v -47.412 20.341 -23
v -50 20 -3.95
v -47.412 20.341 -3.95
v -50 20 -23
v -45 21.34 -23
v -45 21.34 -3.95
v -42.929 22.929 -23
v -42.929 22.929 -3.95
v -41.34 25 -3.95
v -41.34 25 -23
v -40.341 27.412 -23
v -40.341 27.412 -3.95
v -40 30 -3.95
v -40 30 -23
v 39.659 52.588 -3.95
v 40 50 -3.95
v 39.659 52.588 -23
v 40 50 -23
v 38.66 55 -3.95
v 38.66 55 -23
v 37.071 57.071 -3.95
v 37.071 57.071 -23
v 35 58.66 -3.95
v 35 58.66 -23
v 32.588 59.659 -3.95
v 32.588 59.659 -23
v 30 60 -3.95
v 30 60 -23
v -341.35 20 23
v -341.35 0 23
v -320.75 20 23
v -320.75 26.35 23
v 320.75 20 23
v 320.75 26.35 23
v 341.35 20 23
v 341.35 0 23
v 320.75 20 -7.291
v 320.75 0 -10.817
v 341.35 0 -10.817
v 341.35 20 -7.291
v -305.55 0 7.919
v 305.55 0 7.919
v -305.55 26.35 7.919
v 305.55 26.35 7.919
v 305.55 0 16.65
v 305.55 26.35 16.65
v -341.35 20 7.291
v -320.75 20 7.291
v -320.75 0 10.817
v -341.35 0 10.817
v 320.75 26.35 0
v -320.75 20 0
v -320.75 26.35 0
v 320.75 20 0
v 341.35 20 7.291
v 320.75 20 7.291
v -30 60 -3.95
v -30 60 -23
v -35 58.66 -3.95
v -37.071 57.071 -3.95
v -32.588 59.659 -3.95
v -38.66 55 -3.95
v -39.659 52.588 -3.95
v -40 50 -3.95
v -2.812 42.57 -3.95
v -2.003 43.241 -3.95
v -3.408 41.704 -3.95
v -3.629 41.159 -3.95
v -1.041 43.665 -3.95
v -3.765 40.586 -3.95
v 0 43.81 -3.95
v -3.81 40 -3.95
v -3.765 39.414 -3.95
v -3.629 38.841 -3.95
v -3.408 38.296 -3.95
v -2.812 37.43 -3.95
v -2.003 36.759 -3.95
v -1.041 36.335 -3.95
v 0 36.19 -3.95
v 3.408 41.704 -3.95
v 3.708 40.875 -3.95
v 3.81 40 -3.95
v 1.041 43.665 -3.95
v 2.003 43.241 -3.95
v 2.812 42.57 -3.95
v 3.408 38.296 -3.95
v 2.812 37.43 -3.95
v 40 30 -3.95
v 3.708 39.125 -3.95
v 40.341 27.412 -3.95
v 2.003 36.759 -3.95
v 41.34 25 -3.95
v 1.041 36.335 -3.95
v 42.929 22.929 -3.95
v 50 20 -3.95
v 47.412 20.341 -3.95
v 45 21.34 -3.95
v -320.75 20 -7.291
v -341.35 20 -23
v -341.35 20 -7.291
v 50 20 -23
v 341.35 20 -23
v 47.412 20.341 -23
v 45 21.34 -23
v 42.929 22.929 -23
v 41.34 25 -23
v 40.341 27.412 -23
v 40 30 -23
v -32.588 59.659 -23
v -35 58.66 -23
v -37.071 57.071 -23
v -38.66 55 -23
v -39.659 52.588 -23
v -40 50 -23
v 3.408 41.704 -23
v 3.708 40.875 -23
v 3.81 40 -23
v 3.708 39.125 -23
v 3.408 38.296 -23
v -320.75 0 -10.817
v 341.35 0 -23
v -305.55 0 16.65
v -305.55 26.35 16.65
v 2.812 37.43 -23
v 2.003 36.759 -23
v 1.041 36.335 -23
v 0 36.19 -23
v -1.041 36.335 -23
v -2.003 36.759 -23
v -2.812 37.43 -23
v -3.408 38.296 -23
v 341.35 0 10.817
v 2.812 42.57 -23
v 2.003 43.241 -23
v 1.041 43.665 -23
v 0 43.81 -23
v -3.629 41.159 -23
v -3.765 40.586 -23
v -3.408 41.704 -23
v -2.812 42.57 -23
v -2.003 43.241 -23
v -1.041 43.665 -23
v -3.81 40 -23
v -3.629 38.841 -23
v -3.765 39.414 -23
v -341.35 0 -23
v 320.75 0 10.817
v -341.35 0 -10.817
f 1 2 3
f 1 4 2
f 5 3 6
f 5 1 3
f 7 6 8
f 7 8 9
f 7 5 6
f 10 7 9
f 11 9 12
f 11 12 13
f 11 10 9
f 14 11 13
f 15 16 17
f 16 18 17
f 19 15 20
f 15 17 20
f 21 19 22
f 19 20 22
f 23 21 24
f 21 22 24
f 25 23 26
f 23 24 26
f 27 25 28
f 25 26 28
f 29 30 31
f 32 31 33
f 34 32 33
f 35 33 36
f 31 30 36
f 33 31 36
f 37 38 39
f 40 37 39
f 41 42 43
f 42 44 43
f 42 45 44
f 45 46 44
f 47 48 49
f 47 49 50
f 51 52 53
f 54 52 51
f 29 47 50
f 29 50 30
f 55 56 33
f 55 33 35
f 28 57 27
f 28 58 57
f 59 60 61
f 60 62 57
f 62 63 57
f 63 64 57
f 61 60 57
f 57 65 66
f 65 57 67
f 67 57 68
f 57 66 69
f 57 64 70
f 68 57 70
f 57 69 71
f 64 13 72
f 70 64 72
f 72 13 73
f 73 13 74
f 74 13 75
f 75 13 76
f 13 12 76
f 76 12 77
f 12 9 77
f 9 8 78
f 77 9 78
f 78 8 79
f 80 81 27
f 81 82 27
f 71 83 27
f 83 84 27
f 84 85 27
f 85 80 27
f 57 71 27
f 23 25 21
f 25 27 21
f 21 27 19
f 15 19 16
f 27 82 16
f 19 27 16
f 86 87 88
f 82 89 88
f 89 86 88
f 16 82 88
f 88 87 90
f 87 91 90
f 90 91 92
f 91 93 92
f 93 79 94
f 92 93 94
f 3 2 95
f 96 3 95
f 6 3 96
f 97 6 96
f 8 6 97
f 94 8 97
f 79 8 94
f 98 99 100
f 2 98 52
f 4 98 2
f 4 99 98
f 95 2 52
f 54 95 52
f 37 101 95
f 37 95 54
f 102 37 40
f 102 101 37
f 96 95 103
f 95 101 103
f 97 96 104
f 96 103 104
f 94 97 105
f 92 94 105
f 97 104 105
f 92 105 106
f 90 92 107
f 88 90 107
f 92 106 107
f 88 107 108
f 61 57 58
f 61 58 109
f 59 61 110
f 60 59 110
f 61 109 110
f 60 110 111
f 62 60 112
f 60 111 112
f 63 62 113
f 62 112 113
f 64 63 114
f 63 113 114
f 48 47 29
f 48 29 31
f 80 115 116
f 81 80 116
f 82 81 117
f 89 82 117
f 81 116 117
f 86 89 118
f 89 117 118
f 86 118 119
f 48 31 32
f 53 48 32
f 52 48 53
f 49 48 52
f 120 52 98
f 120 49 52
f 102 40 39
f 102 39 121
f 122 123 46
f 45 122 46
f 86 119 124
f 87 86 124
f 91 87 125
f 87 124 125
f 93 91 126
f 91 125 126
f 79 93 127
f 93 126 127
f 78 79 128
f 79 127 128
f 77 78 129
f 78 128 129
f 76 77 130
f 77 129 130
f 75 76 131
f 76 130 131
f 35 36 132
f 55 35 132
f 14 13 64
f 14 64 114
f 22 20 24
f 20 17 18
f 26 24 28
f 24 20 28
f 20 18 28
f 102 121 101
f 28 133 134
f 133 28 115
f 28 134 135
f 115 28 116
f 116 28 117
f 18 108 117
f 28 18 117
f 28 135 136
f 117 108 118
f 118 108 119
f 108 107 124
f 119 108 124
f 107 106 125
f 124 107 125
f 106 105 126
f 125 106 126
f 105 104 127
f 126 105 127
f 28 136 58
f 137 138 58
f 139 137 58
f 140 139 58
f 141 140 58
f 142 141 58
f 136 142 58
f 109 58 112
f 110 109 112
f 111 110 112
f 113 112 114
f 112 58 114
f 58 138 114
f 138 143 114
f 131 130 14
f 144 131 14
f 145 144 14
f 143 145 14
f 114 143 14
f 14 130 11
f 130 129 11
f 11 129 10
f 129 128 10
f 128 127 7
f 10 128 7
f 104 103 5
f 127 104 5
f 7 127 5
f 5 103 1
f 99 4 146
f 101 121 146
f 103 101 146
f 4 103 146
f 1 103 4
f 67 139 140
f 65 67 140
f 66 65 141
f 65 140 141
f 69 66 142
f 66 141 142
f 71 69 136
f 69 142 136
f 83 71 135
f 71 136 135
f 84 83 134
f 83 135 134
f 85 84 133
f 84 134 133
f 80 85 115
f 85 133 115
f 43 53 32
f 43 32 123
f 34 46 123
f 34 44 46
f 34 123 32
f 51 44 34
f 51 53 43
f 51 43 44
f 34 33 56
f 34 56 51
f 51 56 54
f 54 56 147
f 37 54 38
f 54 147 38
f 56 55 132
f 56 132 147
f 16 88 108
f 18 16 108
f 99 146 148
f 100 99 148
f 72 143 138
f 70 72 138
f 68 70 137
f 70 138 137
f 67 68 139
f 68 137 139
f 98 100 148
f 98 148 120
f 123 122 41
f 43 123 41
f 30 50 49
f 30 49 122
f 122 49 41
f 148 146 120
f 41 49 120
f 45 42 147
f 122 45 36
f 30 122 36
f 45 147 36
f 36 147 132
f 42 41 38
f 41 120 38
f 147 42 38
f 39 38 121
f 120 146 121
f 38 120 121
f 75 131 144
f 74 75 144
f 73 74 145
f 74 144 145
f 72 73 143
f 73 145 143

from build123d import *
from OCP.BRepFilletAPI import BRepFilletAPI_MakeChamfer

# Parameters (mm, degrees)
BOSS_EXTRUDE1_DEPTH = 20
SKETCH2_W           = 641.5
SKETCH2_H           = 23
SKETCH2_W_2         = 611.1
SKETCH2_H_2         = 8.73125
BOSS_EXTRUDE2_DEPTH = 6.35
SKETCH4_W           = 80
SKETCH4_H           = 19.05
BOSS_EXTRUDE3_DEPTH = 40
CUT_EXTRUDE2_DEPTH  = 50.8
CHAMFER1_SIZE       = 20
CHAMFER1_SIZE_2     = 3.526539614
SKETCH2_3_W         = 305.55
SKETCH2_3_H         = 8.73125
CUT_EXTRUDE3_DEPTH  = 20
FILLET1_R           = 10


with BuildPart() as part:
    # Sketch1 → Boss-Extrude1 (new body)
    with BuildSketch(Plane(origin=(0, 0, 0), x_dir=(1, 0, 0), z_dir=(0, 1, 0))):
        Polygon((-341.35, 23), (-341.35, 7.291), (-320.75, 7.291), (-320.75, -7.291), (-341.35, -7.291), (-341.35, -23), (341.35, -23), (341.35, -7.291), (320.75, -7.291), (320.75, 7.291), (341.35, 7.291), (341.35, 23), align=None)
    extrude(amount=BOSS_EXTRUDE1_DEPTH)

    # Sketch2 → Boss-Extrude2 (add)
    with BuildSketch(Plane(origin=(0, 20, 0), x_dir=(1, 0, 0), z_dir=(0, 1, 0))):
        with Locations((0, -11.5)):
            Rectangle(SKETCH2_W, SKETCH2_H)
        with Locations((0, -12.284375)):
            Rectangle(SKETCH2_W_2, SKETCH2_H_2, mode=Mode.SUBTRACT)
    extrude(amount=BOSS_EXTRUDE2_DEPTH)

    # Sketch4 → Boss-Extrude3 (add)
    with BuildSketch(Plane(origin=(0, 20, 0), x_dir=(1, 0, 0), z_dir=(0, 1, 0))):
        with Locations((0, 13.475)):
            Rectangle(SKETCH4_W, SKETCH4_H)
    extrude(amount=BOSS_EXTRUDE3_DEPTH)

    # Sketch5 → Cut-Extrude2 (cut)
    with BuildSketch(Plane(origin=(0, 0, -23), x_dir=(-1, 0, 0), z_dir=(0, 0, -1))):
        with BuildLine():
            ThreePointArc((3.407767598, 41.703883799), (0, 43.81), (-3.407767598, 41.703883799))
            Line((-3.407767598, 41.703883799), (0, 40))
            Line((0, 40), (3.407767598, 41.703883799))
        make_face()
        with BuildLine():
            Line((0, 40), (-3.407767598, 41.703883799))
            ThreePointArc((-3.407767598, 41.703883799), (-3.81, 40), (-3.407767598, 38.296116201))
            Line((-3.407767598, 38.296116201), (0, 40))
        make_face()
        with BuildLine():
            Line((3.407767598, 41.703883799), (0, 40))
            Line((0, 40), (3.407767598, 38.296116201))
            ThreePointArc((3.407767598, 38.296116201), (3.70807865, 39.124641373), (3.81, 40))
            ThreePointArc((3.81, 40), (3.70807865, 40.875358627), (3.407767598, 41.703883799))
        make_face()
        with BuildLine():
            Line((3.407767598, 38.296116201), (0, 40))
            Line((0, 40), (-3.407767598, 38.296116201))
            ThreePointArc((-3.407767598, 38.296116201), (0, 36.19), (3.407767598, 38.296116201))
        make_face()
    extrude(amount=-CUT_EXTRUDE2_DEPTH, mode=Mode.SUBTRACT)

    # Chamfer1
    chamfer1_edges_1 = [part.edges().sort_by_distance(p)[0] for p in [
        (331.05, 0, -7.291),
    ]]
    chamfer1_side_1 = [part.faces().sort_by_distance(p)[0] for p in [
        (331.05, 0.070530792, -7.291),
    ]]
    chamfer1_edges_2 = [part.edges().sort_by_distance(p)[0] for p in [
        (331.05, 0, 7.291),
    ]]
    chamfer1_side_2 = [part.faces().sort_by_distance(p)[0] for p in [
        (331.05, 0, 7.361530792),
    ]]
    chamfer1_edges_3 = [part.edges().sort_by_distance(p)[0] for p in [
        (-331.05, 0, 7.291),
    ]]
    chamfer1_side_3 = [part.faces().sort_by_distance(p)[0] for p in [
        (-331.05, 0, 7.361530792),
    ]]
    chamfer1_edges_4 = [part.edges().sort_by_distance(p)[0] for p in [
        (-331.05, 0, -7.291),
    ]]
    chamfer1_side_4 = [part.faces().sort_by_distance(p)[0] for p in [
        (-331.05, 0, -7.361530792),
    ]]
    chamfer1 = BRepFilletAPI_MakeChamfer(part.part.solid().wrapped)
    for e in chamfer1_edges_1:
        chamfer1.Add(CHAMFER1_SIZE - 0.0001, CHAMFER1_SIZE_2 - 0.0001, e.wrapped, chamfer1_side_1[0].wrapped)
    for e in chamfer1_edges_2:
        chamfer1.Add(CHAMFER1_SIZE_2 - 0.0001, CHAMFER1_SIZE - 0.0001, e.wrapped, chamfer1_side_2[0].wrapped)
    for e in chamfer1_edges_3:
        chamfer1.Add(CHAMFER1_SIZE_2 - 0.0001, CHAMFER1_SIZE - 0.0001, e.wrapped, chamfer1_side_3[0].wrapped)
    for e in chamfer1_edges_4:
        chamfer1.Add(CHAMFER1_SIZE_2 - 0.0001, CHAMFER1_SIZE - 0.0001, e.wrapped, chamfer1_side_4[0].wrapped)
    add(Compound.cast(chamfer1.Shape()), mode=Mode.REPLACE)  # a hair under: the kernel refuses the full size

    # Sketch2<3> → Cut-Extrude3 (cut)
    with BuildSketch(Plane(origin=(0, 20, 0), x_dir=(1, 0, 0), z_dir=(0, 1, 0))):
        with Locations((-152.775, -12.284375)):
            Rectangle(SKETCH2_3_W, SKETCH2_3_H)
        with Locations((152.775, -12.284375)):
            Rectangle(SKETCH2_3_W, SKETCH2_3_H)
    extrude(amount=-CUT_EXTRUDE3_DEPTH, mode=Mode.SUBTRACT)

    # Fillet1
    fillet1_edges = [part.edges().sort_by_distance(p)[0] for p in [
        (40, 20, -13.475),
        (-40, 60, -13.475),
        (40, 60, -13.475),
        (-40, 20, -13.475),
    ]]
    fillet(fillet1_edges, radius=FILLET1_R)


solid = part.part
